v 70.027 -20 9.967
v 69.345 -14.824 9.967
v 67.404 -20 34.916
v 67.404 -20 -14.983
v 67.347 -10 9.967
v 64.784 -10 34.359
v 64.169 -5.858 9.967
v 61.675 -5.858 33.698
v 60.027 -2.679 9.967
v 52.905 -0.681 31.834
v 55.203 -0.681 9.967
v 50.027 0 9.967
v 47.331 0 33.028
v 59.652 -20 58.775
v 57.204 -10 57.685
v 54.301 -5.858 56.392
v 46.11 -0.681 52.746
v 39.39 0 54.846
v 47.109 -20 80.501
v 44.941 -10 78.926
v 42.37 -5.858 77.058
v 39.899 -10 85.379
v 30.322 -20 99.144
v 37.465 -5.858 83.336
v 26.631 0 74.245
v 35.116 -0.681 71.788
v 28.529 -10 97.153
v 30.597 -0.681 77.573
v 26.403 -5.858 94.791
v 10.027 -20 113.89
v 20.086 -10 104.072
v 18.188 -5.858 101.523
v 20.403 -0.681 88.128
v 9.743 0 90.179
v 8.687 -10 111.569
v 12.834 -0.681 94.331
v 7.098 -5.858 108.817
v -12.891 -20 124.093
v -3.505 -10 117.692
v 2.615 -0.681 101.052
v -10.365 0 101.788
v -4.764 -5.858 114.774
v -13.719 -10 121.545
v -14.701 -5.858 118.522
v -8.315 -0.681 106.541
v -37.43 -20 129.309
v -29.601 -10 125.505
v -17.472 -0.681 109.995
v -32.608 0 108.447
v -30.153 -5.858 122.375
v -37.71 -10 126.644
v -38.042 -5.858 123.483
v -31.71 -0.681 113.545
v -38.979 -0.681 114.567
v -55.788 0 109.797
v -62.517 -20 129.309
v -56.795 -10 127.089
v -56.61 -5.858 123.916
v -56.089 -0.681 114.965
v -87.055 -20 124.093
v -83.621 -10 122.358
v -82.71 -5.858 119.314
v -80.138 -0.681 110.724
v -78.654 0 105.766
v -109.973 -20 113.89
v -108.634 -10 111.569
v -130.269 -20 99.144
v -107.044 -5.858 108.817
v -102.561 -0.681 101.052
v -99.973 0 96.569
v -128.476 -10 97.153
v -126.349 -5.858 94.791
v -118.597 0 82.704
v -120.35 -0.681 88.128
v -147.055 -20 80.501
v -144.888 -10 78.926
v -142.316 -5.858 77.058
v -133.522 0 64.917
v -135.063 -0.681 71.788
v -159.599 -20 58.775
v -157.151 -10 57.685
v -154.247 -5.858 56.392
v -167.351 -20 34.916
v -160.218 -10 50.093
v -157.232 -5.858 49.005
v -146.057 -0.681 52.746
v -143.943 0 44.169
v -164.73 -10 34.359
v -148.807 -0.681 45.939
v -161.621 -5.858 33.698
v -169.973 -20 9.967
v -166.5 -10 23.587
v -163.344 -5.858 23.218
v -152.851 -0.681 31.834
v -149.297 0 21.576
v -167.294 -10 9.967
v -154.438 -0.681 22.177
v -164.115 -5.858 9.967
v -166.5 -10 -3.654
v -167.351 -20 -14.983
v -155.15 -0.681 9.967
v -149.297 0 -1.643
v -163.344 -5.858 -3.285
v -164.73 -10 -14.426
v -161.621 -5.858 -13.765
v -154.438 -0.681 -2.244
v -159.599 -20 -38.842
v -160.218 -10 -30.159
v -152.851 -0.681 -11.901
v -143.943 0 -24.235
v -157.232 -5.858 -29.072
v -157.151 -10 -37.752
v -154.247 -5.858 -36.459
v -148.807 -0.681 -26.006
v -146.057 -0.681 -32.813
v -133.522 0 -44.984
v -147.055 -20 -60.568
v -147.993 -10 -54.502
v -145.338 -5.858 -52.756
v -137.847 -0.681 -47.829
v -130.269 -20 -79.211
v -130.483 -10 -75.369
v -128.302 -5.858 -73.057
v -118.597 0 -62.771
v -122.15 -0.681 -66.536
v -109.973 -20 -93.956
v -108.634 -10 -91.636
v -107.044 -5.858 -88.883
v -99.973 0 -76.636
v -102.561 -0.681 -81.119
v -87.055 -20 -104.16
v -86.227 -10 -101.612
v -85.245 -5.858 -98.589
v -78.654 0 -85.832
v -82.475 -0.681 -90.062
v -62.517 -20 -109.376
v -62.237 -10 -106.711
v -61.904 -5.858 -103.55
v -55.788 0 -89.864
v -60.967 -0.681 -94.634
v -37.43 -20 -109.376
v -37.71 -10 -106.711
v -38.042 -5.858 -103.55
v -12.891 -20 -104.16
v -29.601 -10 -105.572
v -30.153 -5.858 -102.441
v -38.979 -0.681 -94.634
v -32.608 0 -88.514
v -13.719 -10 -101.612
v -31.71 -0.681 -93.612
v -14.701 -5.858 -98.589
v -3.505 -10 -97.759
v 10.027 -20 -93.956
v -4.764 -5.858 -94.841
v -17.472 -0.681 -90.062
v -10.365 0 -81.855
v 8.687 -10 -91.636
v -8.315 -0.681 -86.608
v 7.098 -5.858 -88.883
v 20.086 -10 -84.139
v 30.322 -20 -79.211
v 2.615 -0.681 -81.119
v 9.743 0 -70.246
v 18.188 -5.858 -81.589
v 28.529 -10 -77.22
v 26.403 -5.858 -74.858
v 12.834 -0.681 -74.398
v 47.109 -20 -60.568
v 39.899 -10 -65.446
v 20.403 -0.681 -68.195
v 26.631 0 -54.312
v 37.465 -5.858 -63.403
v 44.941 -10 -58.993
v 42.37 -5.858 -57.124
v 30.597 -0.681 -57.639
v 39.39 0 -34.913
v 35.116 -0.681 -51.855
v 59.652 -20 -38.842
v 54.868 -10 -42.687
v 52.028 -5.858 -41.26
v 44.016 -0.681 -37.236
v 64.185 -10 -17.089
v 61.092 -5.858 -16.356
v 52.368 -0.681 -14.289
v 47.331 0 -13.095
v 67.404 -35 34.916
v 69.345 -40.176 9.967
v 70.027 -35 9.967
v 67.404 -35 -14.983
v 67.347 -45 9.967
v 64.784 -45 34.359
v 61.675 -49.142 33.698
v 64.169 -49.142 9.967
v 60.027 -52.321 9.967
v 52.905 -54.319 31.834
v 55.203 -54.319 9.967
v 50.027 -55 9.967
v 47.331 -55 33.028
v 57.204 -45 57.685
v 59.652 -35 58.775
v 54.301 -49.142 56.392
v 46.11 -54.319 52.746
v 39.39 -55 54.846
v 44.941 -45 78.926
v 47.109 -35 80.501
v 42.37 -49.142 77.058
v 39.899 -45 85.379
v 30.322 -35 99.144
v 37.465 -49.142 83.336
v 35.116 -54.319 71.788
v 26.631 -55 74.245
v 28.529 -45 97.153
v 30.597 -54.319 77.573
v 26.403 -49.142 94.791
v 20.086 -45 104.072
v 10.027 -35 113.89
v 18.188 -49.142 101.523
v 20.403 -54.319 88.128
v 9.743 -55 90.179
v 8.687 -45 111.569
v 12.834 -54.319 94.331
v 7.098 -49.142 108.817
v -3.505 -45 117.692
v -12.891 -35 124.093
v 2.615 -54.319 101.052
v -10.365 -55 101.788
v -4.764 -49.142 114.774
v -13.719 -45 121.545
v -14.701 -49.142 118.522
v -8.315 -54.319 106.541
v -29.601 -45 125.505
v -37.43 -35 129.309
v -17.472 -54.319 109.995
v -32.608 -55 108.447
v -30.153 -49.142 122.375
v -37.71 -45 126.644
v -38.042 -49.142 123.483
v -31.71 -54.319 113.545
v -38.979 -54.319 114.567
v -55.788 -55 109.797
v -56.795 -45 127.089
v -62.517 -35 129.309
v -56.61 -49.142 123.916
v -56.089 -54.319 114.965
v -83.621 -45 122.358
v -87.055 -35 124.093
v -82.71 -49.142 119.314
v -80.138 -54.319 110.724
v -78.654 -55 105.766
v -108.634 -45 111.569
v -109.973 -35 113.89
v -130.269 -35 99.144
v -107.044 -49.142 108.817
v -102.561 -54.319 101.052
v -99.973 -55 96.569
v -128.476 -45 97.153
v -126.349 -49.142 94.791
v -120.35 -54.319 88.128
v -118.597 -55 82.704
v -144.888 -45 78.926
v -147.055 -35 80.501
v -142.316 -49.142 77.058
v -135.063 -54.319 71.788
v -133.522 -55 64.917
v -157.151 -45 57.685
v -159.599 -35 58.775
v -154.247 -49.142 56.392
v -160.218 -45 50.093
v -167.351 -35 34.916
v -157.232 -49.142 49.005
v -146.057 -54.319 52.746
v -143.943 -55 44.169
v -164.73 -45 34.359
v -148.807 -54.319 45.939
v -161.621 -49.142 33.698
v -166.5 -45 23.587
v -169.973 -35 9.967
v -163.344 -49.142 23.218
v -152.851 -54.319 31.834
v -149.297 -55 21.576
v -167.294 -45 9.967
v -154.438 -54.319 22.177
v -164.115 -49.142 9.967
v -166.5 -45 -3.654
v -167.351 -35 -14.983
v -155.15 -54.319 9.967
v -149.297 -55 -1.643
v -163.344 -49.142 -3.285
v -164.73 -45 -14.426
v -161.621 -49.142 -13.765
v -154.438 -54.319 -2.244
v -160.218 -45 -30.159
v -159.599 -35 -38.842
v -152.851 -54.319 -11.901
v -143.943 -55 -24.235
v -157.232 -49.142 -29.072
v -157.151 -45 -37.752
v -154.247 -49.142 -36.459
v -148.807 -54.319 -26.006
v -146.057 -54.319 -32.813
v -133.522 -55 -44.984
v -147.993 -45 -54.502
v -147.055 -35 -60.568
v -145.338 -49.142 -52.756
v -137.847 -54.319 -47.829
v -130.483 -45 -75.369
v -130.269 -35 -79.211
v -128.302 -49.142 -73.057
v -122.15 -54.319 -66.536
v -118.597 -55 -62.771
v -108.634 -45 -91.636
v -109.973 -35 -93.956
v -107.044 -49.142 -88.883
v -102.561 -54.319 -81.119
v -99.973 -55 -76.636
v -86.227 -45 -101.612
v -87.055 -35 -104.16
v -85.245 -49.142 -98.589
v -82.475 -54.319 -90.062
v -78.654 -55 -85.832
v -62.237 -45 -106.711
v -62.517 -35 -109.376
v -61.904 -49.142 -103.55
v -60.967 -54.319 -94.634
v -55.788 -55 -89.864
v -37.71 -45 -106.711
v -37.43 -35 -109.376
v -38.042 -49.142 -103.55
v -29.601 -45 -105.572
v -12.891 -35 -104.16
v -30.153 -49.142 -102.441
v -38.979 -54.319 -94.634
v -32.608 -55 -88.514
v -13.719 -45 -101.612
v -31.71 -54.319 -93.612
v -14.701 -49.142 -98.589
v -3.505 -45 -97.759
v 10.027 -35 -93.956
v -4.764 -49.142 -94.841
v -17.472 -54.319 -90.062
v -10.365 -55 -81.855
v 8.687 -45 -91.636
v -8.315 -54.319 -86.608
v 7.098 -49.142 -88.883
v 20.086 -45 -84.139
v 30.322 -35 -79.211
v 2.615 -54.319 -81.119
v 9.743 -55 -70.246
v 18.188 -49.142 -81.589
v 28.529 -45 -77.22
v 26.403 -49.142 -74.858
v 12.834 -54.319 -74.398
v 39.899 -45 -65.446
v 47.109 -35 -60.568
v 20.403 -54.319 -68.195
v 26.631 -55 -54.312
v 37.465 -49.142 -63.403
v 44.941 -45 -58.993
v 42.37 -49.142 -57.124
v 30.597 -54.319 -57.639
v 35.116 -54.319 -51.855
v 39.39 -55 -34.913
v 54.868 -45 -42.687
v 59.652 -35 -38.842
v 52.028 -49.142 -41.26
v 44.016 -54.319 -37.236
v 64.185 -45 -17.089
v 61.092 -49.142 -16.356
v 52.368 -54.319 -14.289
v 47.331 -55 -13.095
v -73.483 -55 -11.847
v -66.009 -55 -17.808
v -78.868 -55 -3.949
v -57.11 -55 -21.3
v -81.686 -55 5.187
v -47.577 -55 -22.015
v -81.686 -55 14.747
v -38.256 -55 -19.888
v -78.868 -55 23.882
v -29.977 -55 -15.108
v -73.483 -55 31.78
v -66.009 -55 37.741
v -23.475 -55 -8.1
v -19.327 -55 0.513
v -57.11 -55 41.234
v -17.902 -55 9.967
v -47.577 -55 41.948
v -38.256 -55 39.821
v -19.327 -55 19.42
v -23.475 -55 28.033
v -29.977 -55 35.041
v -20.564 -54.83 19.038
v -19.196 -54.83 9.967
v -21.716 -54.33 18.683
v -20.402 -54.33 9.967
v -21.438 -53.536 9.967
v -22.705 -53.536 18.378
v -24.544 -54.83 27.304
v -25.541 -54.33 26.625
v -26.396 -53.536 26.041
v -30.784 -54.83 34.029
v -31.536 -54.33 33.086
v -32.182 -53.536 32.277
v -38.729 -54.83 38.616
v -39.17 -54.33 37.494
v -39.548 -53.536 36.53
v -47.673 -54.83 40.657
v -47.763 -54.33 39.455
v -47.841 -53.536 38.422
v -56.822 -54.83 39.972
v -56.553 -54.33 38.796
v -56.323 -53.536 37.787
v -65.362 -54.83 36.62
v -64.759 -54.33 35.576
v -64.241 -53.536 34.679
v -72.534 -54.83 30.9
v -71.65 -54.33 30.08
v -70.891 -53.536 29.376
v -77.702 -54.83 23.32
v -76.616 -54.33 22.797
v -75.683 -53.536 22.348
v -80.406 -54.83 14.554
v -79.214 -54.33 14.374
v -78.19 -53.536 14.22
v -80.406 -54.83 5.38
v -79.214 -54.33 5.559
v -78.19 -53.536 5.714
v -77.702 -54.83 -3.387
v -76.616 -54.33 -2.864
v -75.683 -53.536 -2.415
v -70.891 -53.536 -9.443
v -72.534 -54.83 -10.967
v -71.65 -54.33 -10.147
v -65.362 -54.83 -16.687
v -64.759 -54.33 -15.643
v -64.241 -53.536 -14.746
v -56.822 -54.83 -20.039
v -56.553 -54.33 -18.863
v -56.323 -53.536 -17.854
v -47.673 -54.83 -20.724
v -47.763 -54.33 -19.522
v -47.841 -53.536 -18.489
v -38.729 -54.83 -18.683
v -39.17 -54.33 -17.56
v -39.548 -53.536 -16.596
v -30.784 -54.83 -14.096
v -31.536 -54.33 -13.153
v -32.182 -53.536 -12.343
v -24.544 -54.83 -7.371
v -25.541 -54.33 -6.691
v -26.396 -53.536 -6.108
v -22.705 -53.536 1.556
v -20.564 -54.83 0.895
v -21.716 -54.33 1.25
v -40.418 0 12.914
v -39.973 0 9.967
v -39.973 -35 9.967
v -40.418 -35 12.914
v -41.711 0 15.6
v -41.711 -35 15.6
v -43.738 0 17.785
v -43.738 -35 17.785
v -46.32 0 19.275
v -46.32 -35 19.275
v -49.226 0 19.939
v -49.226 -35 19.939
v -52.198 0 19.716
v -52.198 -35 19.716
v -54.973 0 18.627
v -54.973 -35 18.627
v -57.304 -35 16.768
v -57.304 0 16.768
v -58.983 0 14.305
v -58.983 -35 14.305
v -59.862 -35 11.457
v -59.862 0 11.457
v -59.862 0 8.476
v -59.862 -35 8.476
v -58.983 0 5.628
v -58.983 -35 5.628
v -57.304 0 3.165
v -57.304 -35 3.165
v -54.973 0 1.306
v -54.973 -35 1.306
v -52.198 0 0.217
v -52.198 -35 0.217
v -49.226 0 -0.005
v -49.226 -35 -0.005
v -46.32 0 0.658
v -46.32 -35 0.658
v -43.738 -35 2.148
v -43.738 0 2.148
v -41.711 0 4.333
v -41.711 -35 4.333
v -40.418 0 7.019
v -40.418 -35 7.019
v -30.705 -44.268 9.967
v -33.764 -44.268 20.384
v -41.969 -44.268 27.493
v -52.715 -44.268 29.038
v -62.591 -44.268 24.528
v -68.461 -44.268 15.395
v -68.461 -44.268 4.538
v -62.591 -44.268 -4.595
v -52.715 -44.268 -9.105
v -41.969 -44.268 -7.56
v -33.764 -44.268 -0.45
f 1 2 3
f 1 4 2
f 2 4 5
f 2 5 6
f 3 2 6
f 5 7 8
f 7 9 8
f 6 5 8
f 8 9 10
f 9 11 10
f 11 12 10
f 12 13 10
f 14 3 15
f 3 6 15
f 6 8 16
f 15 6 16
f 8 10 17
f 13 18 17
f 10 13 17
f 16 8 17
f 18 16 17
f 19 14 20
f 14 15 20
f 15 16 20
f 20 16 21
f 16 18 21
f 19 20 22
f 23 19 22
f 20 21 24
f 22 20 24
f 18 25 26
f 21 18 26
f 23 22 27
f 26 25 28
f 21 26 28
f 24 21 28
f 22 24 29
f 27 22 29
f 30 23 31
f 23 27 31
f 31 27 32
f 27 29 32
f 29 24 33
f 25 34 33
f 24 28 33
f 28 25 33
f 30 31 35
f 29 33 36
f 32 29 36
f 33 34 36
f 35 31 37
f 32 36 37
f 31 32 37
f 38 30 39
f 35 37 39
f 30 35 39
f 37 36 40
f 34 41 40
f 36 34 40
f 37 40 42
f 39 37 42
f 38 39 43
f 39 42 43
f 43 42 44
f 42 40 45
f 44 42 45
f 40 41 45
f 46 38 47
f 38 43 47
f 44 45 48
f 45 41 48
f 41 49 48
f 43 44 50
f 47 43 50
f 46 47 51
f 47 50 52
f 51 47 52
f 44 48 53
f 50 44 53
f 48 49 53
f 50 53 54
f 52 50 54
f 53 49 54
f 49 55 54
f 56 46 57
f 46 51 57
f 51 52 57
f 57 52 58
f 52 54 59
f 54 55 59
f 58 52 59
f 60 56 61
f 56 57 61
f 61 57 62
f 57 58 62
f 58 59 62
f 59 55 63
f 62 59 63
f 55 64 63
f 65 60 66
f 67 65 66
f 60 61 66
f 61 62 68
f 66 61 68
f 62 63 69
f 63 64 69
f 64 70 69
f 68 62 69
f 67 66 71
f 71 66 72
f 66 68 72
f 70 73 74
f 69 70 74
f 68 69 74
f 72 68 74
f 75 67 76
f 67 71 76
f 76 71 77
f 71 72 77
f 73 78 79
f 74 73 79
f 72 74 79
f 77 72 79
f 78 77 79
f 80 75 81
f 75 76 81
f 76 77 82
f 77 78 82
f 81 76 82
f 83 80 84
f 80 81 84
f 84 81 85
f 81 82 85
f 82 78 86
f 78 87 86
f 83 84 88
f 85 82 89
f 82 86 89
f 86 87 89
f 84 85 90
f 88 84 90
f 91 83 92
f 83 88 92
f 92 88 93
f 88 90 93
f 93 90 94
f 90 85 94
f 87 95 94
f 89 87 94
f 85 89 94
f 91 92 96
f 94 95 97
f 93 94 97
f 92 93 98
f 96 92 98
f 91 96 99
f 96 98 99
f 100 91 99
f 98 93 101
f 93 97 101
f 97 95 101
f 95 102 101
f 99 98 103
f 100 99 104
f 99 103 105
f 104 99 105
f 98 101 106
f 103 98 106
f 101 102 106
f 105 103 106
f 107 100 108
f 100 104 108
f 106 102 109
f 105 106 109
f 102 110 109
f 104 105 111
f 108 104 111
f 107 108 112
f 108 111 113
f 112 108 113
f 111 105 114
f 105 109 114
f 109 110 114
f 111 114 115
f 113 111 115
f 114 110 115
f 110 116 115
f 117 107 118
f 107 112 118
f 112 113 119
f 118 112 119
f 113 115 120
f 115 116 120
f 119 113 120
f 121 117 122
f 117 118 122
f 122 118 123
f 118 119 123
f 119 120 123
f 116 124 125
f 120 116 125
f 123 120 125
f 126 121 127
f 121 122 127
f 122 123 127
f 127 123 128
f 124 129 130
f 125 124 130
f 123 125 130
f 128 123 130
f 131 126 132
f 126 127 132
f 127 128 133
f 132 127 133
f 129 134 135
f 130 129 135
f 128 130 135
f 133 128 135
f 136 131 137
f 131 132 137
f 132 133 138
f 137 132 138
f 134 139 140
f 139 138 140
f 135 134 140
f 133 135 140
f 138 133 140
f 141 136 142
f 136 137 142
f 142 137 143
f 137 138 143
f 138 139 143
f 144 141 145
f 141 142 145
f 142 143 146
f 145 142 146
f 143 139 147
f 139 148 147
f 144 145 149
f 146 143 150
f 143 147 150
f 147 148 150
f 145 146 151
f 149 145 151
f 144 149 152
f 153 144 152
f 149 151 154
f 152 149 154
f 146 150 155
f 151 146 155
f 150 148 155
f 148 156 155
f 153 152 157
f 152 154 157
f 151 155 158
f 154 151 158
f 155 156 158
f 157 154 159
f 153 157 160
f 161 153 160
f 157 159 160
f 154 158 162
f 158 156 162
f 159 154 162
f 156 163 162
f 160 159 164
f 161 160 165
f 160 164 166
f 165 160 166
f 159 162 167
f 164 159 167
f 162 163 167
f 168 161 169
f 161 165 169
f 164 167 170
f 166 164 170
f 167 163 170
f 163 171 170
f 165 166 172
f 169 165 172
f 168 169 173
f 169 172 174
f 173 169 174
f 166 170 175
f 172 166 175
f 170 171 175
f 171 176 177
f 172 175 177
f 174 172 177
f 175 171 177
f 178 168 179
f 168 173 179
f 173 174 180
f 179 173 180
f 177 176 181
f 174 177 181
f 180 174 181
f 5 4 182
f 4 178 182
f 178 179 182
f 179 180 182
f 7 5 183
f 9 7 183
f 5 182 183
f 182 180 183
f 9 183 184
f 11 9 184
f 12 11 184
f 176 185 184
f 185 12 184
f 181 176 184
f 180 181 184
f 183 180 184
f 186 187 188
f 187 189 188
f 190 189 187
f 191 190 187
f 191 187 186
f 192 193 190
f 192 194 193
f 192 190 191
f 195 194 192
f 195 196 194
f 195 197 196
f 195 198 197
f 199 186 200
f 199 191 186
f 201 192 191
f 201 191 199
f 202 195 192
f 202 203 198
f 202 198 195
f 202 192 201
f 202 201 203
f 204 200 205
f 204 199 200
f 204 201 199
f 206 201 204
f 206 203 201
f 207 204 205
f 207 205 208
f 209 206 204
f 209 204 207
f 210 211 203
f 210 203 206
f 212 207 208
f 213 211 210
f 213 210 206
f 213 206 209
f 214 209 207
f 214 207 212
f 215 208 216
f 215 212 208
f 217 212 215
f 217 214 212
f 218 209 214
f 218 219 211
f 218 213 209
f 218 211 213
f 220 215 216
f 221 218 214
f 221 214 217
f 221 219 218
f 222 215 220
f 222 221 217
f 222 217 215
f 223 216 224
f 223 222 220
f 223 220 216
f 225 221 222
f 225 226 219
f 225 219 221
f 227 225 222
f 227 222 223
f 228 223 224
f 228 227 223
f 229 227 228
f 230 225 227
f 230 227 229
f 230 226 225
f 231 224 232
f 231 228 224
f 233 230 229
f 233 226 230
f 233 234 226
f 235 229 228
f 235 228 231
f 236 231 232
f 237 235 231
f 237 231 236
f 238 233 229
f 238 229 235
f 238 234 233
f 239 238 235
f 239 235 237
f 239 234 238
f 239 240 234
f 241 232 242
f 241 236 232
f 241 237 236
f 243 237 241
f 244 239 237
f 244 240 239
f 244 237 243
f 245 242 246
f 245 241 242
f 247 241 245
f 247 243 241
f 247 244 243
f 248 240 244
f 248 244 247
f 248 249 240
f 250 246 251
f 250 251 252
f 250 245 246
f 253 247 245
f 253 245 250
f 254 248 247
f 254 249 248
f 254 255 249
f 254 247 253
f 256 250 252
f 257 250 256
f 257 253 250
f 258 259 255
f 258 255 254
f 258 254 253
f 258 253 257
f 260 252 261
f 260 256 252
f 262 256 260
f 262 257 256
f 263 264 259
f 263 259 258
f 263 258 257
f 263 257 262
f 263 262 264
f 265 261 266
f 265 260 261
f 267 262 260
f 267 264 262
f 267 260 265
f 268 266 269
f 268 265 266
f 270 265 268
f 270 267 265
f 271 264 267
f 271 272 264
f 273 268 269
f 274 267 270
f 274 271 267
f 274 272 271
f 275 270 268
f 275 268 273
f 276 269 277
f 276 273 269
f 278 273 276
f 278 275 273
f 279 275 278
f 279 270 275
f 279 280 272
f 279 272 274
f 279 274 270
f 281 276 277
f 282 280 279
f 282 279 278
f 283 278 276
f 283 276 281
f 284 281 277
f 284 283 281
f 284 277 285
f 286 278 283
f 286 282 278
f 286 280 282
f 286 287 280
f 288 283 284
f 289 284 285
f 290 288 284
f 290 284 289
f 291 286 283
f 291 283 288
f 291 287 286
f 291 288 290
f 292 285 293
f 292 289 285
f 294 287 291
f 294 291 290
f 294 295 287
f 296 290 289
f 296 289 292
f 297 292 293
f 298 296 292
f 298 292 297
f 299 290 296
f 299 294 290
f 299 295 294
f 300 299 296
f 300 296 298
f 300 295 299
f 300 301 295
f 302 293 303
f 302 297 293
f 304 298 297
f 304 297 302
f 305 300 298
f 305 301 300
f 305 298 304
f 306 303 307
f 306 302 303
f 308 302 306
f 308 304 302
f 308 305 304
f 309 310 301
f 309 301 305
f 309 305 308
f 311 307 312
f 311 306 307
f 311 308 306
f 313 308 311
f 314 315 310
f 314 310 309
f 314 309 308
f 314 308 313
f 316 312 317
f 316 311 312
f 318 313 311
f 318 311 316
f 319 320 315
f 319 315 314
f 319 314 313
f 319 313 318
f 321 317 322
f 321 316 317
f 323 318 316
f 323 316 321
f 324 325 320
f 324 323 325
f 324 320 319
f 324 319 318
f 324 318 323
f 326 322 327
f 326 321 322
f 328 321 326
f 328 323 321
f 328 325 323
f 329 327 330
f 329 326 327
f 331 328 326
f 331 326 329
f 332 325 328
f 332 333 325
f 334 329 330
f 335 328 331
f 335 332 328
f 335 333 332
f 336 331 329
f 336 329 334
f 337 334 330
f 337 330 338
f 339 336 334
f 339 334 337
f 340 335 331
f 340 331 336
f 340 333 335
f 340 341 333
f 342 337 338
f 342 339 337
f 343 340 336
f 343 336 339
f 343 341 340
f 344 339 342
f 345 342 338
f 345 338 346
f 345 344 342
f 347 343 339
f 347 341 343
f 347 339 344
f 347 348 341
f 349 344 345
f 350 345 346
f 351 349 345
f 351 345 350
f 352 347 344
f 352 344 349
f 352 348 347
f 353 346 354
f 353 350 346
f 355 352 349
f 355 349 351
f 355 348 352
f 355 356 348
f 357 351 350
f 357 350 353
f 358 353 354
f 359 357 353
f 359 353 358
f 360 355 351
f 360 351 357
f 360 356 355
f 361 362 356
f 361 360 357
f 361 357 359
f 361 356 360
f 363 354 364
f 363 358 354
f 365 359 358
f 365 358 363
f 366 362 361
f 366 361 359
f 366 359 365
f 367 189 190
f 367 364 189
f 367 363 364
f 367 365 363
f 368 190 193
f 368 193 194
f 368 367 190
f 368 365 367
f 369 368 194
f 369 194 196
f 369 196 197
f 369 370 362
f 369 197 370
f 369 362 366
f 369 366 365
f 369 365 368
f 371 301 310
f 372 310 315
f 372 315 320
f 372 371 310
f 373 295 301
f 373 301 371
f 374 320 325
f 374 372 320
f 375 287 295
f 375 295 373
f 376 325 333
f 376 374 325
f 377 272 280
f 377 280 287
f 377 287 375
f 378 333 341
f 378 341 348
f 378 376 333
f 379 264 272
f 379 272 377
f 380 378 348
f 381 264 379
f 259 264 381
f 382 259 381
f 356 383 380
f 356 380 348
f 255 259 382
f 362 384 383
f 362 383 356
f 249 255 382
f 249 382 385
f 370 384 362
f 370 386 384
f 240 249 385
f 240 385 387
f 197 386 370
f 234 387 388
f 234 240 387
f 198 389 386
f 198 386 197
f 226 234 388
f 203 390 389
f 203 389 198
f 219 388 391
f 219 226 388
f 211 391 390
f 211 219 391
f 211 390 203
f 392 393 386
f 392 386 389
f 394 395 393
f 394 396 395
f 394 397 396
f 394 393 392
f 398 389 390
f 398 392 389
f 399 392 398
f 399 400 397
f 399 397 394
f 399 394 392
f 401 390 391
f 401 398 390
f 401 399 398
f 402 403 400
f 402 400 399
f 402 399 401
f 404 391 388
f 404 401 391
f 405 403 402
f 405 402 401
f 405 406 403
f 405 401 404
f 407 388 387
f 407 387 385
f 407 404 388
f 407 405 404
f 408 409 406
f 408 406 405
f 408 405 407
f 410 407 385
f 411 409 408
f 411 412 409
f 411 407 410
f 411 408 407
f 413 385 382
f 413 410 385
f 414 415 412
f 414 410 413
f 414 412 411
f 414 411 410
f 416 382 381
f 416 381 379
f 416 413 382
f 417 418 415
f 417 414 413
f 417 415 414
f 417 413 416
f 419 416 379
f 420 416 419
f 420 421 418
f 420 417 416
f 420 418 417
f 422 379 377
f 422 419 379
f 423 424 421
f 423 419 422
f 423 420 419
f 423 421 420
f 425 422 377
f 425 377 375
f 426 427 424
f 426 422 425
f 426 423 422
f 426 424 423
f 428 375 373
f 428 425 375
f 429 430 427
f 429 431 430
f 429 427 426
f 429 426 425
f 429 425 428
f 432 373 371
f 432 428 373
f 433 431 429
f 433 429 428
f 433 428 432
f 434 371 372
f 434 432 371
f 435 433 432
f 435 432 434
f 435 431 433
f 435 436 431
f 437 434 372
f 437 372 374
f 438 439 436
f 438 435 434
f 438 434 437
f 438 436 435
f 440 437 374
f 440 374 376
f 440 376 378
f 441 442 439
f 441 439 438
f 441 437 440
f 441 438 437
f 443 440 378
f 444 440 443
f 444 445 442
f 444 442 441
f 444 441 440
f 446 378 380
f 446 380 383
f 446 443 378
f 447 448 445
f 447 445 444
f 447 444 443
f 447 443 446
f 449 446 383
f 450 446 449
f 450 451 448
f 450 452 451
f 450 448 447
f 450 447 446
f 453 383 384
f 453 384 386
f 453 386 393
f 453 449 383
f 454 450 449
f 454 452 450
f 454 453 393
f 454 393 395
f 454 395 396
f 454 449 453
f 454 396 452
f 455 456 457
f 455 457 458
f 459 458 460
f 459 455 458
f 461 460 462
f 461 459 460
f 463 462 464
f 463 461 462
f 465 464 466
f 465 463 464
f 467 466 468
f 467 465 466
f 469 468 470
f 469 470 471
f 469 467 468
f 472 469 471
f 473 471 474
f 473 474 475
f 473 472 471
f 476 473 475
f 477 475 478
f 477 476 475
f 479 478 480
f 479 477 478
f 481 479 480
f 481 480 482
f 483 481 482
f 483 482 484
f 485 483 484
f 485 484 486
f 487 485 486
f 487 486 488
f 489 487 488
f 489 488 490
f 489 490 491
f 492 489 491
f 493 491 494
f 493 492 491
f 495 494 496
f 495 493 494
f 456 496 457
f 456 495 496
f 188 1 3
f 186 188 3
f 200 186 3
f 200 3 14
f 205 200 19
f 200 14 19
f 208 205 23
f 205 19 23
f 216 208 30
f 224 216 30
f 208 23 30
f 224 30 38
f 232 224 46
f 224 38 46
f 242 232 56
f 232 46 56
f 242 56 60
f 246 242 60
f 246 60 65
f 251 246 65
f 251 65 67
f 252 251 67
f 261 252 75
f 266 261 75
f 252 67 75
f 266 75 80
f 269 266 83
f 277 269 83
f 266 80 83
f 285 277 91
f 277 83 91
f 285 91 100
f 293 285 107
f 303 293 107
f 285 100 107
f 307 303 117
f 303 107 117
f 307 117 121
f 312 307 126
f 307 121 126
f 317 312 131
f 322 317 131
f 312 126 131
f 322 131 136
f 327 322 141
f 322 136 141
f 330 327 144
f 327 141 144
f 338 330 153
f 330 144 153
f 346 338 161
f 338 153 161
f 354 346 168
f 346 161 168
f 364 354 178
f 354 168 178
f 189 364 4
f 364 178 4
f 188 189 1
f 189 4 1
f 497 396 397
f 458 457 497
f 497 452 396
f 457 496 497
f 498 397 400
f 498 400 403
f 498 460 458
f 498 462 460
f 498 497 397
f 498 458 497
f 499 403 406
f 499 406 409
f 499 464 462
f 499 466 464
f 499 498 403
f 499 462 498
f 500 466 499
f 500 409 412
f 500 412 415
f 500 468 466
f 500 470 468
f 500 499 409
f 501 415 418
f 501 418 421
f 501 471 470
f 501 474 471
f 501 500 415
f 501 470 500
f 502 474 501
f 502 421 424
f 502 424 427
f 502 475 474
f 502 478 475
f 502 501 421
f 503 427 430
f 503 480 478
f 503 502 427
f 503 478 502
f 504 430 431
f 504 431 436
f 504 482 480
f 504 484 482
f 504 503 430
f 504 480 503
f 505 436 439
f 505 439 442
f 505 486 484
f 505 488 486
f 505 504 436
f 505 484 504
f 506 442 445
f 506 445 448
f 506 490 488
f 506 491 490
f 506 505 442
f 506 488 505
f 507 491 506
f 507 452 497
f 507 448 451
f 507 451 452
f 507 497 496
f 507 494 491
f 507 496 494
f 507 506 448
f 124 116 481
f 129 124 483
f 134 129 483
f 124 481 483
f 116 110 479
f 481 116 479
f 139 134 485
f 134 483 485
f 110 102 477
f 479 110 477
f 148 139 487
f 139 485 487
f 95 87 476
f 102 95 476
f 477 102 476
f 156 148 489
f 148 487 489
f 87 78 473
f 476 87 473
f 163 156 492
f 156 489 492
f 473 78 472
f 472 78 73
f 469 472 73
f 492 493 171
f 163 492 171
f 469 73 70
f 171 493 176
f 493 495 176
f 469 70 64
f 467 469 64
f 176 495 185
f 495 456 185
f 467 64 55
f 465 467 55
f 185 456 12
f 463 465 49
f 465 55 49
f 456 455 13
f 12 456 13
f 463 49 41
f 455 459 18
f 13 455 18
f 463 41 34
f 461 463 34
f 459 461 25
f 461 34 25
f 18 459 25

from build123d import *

# Parameters (mm, degrees)
F0_R     = 120
F0_R_2   = 10
F1_DEPTH = 55
F2_R     = 20
F3_SIZE  = 20
F4_R     = 5


with BuildPart() as f1:
    # F0 (on Front) → F1 (new body)
    with BuildSketch(Plane.XZ):
        with Locations((-49.9732643366, 9.9665783346)):
            Circle(F0_R)
        with Locations((-49.9732643366, 9.9665783346)):
            Circle(F0_R_2, mode=Mode.SUBTRACT)
    extrude(amount=F1_DEPTH)

    # F2
    f2_edges = [f1.edges().sort_by_distance(p)[0] for p in [
        (-169.973264, -55, 9.966578),
        (-169.973264, 0, 9.966578),
    ]]
    fillet(f2_edges, radius=F2_R)

    # F3
    f3_edges = [f1.edges().sort_by_distance(p)[0] for p in [
        (-59.973264, -55, 9.966578),
    ]]
    chamfer(f3_edges, length=F3_SIZE)

    # F4
    f4_edges = [f1.edges().sort_by_distance(p)[0] for p in [
        (-79.973264, -55, 9.966578),
        (-149.973264, -55, 9.966578),
    ]]
    fillet(f4_edges, radius=F4_R)


solid = f1.part
